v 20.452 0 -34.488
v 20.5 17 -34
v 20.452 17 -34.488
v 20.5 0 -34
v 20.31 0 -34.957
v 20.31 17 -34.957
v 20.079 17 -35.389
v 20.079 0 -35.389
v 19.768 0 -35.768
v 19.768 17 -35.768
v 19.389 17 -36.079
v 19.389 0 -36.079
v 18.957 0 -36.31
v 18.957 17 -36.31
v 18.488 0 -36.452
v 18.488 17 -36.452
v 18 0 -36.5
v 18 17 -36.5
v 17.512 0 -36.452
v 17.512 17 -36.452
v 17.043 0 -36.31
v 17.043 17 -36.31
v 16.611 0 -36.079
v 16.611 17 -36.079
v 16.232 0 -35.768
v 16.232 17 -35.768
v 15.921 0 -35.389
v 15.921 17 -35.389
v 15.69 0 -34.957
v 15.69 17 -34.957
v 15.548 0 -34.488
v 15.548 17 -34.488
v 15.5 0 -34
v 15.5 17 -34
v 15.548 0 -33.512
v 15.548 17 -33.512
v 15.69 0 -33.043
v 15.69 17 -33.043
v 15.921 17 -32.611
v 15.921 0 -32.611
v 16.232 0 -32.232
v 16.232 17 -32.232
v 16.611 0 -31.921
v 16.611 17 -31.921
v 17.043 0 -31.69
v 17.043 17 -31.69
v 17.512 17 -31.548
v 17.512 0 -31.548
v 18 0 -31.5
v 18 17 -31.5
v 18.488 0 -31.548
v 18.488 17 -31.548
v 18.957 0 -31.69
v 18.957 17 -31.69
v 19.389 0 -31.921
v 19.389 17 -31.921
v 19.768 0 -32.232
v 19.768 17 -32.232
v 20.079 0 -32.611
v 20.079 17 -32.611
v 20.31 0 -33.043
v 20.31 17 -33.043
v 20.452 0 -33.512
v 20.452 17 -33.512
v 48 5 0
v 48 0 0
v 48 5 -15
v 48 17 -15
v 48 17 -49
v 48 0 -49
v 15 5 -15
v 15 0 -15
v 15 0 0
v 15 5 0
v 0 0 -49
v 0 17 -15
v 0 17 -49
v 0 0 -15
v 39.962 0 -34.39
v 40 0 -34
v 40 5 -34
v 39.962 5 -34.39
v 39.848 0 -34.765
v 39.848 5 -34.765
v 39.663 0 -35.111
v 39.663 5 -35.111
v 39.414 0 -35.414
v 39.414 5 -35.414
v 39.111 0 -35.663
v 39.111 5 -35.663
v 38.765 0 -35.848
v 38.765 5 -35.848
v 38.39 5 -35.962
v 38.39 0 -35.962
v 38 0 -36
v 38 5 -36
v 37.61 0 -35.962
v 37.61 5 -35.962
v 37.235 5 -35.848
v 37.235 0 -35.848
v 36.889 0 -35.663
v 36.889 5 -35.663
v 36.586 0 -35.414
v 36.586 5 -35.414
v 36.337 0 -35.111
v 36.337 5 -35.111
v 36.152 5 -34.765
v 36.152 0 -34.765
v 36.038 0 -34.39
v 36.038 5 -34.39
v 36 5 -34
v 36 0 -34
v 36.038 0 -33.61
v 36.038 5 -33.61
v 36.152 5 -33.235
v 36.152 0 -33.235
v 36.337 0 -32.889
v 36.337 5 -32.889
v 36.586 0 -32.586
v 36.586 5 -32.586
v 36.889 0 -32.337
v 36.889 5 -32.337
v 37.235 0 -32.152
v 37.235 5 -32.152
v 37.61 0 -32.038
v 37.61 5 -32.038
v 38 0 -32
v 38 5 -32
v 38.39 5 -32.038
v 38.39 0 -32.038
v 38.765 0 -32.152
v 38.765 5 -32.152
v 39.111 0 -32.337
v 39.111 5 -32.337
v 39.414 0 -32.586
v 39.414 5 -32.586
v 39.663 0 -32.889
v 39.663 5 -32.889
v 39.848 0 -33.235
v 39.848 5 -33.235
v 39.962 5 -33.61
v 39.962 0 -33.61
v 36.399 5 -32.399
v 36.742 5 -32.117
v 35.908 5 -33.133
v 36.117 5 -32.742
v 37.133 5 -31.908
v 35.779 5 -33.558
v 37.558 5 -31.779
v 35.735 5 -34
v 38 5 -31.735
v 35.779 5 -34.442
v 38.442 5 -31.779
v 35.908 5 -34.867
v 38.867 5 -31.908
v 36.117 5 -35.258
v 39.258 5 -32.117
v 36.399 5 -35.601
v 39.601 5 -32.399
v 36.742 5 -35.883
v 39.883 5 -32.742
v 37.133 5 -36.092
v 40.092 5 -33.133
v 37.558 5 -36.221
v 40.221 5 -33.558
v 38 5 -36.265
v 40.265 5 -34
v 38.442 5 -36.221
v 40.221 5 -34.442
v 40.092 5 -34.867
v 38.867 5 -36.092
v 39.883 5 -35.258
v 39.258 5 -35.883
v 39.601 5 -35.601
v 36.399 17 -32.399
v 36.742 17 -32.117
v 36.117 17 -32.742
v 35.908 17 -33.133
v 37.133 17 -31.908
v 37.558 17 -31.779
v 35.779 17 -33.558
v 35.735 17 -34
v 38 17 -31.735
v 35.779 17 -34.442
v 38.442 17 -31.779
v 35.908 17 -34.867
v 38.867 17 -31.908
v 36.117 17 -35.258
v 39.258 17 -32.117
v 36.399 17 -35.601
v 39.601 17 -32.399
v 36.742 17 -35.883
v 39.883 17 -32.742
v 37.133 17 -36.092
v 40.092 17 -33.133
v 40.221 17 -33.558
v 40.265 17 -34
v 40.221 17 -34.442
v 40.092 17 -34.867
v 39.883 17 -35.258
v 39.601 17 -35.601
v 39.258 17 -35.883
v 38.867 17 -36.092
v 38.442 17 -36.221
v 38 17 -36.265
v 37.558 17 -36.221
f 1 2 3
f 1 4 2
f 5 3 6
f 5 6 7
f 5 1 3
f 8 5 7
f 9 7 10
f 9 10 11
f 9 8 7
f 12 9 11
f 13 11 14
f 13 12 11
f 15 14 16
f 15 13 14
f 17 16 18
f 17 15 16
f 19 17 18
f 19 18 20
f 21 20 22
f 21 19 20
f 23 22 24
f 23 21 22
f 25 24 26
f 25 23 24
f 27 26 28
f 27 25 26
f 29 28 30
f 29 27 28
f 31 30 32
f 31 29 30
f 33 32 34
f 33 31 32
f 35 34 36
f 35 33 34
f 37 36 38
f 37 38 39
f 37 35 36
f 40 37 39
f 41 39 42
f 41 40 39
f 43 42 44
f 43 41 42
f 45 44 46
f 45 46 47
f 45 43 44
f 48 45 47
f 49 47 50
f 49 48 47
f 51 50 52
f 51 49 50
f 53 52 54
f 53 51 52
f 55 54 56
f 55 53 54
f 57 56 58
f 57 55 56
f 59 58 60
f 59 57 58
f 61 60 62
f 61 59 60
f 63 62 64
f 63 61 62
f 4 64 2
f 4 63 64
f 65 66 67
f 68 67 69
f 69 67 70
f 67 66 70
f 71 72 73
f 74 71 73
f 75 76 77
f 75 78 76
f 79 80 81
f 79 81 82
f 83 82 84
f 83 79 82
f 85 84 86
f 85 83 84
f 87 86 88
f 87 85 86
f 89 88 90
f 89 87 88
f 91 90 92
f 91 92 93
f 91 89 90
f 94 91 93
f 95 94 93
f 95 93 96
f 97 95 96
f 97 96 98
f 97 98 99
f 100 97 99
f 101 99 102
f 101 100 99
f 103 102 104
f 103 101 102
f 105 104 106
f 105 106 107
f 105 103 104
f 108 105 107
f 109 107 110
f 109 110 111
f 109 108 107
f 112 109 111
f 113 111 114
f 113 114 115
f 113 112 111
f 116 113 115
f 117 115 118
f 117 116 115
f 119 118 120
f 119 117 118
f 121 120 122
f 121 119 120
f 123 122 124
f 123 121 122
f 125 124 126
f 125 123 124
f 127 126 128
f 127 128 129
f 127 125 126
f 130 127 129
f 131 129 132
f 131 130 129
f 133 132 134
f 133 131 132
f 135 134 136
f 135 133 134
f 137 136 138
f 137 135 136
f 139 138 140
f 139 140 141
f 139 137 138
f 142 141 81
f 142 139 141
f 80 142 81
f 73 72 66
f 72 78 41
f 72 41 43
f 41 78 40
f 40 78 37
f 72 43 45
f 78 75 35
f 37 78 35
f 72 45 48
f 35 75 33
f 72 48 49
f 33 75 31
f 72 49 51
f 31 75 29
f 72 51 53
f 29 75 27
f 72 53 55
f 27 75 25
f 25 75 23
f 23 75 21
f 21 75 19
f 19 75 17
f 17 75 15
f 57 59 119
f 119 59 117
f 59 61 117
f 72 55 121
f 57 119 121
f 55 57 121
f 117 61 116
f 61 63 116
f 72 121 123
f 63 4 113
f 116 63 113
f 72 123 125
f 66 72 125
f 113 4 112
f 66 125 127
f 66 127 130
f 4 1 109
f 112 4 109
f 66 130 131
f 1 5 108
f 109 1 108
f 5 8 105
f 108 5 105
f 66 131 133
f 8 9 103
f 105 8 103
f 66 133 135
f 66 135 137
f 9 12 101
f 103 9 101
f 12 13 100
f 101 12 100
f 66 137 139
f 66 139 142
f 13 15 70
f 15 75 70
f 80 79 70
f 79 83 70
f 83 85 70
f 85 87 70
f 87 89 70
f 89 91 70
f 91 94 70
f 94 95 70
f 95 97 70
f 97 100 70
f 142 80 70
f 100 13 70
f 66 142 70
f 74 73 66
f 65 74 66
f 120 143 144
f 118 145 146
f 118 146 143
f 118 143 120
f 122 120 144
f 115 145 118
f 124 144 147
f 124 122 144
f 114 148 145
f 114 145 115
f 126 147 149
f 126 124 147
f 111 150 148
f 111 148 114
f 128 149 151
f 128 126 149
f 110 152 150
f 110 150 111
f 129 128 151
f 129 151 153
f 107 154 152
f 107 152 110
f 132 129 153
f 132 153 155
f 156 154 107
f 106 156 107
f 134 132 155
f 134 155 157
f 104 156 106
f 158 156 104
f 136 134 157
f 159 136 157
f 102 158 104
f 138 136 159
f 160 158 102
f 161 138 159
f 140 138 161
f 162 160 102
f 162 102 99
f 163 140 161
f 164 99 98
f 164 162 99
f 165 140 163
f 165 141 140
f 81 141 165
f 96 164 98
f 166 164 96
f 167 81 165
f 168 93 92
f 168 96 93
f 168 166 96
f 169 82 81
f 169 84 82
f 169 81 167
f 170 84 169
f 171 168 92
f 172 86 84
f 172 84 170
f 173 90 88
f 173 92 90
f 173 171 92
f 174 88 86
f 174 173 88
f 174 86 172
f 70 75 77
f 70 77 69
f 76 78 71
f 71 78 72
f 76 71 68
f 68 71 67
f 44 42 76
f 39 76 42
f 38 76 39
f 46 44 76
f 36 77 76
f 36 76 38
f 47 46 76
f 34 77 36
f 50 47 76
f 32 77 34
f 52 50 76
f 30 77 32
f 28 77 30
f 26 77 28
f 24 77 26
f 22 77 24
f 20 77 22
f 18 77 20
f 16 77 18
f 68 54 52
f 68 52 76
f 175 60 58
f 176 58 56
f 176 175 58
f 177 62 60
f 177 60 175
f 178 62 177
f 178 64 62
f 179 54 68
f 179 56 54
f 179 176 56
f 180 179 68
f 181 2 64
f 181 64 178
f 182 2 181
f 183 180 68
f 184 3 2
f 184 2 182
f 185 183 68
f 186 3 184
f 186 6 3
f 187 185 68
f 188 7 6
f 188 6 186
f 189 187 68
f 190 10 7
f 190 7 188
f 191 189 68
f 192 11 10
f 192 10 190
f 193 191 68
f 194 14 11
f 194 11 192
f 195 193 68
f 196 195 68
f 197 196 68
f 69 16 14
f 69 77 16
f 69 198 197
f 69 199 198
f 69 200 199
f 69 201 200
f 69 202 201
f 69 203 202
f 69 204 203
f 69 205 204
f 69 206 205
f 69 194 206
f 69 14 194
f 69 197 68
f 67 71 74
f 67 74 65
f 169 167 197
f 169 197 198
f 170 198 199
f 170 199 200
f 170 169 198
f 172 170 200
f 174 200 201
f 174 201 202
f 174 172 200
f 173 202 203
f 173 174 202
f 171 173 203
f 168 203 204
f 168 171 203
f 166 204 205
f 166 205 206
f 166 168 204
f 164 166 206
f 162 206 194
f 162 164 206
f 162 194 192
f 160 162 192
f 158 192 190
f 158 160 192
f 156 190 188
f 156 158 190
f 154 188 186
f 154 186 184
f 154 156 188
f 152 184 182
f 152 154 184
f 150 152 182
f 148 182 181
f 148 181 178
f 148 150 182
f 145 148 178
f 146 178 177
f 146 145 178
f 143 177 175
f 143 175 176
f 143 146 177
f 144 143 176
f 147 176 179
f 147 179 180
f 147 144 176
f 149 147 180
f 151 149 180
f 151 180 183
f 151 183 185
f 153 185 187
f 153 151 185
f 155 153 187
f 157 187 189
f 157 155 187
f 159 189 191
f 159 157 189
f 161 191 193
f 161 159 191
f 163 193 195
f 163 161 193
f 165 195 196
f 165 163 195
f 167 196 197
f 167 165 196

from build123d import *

# Parameters (mm, degrees)
SKETCH1_R           = 2.5
SKETCH1_R_2         = 2
BOSS_EXTRUDE1_DEPTH = 5
SKETCH2_W           = 48
SKETCH2_H           = 34
SKETCH2_R           = 2.5
SKETCH2_R_2         = 2.264702838
BOSS_EXTRUDE2_DEPTH = 12


with BuildPart() as part:
    # Sketch1 → Boss-Extrude1 (new body)
    with BuildSketch(Plane(origin=(0, 0, 0), x_dir=(1, 0, 0), z_dir=(0, 1, 0))):
        Polygon((15, 15), (15, 0), (48, 0), (48, 49), (0, 49), (0, 15), align=None)
        with Locations((18, 34)):
            Circle(SKETCH1_R, mode=Mode.SUBTRACT)
        with Locations((38, 34)):
            Circle(SKETCH1_R_2, mode=Mode.SUBTRACT)
    extrude(amount=BOSS_EXTRUDE1_DEPTH)

    # Sketch2 → Boss-Extrude2 (add)
    with BuildSketch(Plane(origin=(0, 5, 0), x_dir=(1, 0, 0), z_dir=(0, 1, 0))):
        with Locations((24, 32)):
            Rectangle(SKETCH2_W, SKETCH2_H)
        with Locations((18, 34)):
            Circle(SKETCH2_R, mode=Mode.SUBTRACT)
        with Locations((38, 34)):
            Circle(SKETCH2_R_2, mode=Mode.SUBTRACT)
    extrude(amount=BOSS_EXTRUDE2_DEPTH)


solid = part.part
